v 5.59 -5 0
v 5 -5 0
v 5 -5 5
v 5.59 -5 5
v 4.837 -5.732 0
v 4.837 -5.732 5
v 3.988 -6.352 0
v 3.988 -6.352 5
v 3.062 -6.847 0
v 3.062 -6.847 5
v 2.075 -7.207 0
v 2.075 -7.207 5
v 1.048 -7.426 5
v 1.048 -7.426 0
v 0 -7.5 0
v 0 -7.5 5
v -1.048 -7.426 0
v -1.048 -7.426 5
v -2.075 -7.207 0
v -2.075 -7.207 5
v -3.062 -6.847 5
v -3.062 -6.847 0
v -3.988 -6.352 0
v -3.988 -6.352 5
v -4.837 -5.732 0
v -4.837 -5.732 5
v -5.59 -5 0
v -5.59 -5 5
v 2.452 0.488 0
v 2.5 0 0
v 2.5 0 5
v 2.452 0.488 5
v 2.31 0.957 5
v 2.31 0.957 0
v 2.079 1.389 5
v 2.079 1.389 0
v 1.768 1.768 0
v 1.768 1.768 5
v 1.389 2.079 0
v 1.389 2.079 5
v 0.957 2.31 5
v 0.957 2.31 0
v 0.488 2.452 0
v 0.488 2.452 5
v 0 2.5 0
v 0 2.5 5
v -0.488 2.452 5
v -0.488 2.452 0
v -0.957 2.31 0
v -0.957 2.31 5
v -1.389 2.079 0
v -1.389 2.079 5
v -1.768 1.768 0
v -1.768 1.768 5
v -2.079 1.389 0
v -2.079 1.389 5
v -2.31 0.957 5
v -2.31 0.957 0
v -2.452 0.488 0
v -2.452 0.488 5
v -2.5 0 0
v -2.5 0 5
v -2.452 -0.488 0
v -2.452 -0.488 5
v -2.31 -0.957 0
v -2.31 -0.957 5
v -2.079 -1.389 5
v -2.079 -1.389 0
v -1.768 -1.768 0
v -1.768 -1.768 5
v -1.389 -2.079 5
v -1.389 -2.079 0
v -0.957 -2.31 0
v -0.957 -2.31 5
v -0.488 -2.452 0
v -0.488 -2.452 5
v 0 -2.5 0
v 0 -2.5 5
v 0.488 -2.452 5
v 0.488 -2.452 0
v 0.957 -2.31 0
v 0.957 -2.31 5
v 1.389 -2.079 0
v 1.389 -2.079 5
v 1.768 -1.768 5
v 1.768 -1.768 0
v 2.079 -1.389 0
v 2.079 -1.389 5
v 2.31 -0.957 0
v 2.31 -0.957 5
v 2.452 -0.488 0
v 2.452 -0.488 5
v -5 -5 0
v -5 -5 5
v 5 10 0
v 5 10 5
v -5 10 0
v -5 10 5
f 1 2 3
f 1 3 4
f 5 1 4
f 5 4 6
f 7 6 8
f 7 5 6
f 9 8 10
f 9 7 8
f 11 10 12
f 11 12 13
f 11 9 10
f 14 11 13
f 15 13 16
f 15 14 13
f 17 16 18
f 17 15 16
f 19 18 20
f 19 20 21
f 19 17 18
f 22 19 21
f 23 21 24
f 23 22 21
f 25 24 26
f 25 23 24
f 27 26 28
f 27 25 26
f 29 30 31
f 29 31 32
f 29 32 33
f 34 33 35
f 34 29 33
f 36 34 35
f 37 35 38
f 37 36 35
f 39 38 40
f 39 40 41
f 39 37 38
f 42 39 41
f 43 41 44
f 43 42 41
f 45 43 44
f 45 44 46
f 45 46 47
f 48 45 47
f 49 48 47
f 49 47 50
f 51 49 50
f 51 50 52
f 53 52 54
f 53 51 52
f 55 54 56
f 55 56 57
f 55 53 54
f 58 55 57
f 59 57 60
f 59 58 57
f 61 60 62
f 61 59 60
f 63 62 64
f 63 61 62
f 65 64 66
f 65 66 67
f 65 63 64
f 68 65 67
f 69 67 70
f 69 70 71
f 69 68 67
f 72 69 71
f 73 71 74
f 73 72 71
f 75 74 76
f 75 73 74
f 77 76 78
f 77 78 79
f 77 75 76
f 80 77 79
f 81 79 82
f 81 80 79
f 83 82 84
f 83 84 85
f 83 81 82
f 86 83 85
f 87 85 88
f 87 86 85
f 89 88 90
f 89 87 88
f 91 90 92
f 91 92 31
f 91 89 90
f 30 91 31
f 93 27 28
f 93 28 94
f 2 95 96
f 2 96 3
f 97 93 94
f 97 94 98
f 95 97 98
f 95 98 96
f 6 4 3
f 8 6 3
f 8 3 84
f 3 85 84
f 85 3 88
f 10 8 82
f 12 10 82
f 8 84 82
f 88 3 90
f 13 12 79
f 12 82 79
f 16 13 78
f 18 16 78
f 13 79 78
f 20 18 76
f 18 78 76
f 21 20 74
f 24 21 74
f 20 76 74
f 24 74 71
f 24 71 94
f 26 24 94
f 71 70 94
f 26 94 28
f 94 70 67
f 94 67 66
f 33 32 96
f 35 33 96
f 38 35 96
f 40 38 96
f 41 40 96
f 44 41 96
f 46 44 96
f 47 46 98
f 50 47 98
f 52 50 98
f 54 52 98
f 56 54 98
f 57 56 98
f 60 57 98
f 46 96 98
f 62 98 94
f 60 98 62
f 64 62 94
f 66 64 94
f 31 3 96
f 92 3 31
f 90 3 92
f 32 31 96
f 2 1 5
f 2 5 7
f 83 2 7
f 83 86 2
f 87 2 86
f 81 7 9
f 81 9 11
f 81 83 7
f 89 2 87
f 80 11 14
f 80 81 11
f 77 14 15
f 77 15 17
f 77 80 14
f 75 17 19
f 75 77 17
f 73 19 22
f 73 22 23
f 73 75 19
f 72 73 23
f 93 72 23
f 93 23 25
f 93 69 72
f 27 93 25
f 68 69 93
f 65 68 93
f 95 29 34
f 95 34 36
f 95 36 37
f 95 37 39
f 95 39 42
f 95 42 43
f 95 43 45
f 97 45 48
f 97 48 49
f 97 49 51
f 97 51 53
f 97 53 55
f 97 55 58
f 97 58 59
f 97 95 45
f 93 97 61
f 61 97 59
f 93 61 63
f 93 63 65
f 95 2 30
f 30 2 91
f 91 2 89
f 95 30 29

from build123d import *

# Parameters (mm, degrees)
CROQUIS1_R              = 2.5
SALIENTE_EXTRUIR1_DEPTH = 5


with BuildPart() as part:
    # Croquis1 → Saliente-Extruir1 (new body)
    with BuildSketch(Plane.XY):
        with BuildLine():
            Line((5, -5), (5.590169944, -5))
            ThreePointArc((5.590169944, -5), (0, -7.5), (-5.590169944, -5))
            Line((-5.590169944, -5), (-5, -5))
            Line((-5, -5), (-5, 5))
            Line((-5, 5), (-5, 10))
            Line((-5, 10), (5, 10))
            Line((5, 10), (5, 5))
            Line((5, 5), (5, -5))
        make_face()
        Circle(CROQUIS1_R, mode=Mode.SUBTRACT)
    extrude(amount=SALIENTE_EXTRUIR1_DEPTH)


solid = part.part
